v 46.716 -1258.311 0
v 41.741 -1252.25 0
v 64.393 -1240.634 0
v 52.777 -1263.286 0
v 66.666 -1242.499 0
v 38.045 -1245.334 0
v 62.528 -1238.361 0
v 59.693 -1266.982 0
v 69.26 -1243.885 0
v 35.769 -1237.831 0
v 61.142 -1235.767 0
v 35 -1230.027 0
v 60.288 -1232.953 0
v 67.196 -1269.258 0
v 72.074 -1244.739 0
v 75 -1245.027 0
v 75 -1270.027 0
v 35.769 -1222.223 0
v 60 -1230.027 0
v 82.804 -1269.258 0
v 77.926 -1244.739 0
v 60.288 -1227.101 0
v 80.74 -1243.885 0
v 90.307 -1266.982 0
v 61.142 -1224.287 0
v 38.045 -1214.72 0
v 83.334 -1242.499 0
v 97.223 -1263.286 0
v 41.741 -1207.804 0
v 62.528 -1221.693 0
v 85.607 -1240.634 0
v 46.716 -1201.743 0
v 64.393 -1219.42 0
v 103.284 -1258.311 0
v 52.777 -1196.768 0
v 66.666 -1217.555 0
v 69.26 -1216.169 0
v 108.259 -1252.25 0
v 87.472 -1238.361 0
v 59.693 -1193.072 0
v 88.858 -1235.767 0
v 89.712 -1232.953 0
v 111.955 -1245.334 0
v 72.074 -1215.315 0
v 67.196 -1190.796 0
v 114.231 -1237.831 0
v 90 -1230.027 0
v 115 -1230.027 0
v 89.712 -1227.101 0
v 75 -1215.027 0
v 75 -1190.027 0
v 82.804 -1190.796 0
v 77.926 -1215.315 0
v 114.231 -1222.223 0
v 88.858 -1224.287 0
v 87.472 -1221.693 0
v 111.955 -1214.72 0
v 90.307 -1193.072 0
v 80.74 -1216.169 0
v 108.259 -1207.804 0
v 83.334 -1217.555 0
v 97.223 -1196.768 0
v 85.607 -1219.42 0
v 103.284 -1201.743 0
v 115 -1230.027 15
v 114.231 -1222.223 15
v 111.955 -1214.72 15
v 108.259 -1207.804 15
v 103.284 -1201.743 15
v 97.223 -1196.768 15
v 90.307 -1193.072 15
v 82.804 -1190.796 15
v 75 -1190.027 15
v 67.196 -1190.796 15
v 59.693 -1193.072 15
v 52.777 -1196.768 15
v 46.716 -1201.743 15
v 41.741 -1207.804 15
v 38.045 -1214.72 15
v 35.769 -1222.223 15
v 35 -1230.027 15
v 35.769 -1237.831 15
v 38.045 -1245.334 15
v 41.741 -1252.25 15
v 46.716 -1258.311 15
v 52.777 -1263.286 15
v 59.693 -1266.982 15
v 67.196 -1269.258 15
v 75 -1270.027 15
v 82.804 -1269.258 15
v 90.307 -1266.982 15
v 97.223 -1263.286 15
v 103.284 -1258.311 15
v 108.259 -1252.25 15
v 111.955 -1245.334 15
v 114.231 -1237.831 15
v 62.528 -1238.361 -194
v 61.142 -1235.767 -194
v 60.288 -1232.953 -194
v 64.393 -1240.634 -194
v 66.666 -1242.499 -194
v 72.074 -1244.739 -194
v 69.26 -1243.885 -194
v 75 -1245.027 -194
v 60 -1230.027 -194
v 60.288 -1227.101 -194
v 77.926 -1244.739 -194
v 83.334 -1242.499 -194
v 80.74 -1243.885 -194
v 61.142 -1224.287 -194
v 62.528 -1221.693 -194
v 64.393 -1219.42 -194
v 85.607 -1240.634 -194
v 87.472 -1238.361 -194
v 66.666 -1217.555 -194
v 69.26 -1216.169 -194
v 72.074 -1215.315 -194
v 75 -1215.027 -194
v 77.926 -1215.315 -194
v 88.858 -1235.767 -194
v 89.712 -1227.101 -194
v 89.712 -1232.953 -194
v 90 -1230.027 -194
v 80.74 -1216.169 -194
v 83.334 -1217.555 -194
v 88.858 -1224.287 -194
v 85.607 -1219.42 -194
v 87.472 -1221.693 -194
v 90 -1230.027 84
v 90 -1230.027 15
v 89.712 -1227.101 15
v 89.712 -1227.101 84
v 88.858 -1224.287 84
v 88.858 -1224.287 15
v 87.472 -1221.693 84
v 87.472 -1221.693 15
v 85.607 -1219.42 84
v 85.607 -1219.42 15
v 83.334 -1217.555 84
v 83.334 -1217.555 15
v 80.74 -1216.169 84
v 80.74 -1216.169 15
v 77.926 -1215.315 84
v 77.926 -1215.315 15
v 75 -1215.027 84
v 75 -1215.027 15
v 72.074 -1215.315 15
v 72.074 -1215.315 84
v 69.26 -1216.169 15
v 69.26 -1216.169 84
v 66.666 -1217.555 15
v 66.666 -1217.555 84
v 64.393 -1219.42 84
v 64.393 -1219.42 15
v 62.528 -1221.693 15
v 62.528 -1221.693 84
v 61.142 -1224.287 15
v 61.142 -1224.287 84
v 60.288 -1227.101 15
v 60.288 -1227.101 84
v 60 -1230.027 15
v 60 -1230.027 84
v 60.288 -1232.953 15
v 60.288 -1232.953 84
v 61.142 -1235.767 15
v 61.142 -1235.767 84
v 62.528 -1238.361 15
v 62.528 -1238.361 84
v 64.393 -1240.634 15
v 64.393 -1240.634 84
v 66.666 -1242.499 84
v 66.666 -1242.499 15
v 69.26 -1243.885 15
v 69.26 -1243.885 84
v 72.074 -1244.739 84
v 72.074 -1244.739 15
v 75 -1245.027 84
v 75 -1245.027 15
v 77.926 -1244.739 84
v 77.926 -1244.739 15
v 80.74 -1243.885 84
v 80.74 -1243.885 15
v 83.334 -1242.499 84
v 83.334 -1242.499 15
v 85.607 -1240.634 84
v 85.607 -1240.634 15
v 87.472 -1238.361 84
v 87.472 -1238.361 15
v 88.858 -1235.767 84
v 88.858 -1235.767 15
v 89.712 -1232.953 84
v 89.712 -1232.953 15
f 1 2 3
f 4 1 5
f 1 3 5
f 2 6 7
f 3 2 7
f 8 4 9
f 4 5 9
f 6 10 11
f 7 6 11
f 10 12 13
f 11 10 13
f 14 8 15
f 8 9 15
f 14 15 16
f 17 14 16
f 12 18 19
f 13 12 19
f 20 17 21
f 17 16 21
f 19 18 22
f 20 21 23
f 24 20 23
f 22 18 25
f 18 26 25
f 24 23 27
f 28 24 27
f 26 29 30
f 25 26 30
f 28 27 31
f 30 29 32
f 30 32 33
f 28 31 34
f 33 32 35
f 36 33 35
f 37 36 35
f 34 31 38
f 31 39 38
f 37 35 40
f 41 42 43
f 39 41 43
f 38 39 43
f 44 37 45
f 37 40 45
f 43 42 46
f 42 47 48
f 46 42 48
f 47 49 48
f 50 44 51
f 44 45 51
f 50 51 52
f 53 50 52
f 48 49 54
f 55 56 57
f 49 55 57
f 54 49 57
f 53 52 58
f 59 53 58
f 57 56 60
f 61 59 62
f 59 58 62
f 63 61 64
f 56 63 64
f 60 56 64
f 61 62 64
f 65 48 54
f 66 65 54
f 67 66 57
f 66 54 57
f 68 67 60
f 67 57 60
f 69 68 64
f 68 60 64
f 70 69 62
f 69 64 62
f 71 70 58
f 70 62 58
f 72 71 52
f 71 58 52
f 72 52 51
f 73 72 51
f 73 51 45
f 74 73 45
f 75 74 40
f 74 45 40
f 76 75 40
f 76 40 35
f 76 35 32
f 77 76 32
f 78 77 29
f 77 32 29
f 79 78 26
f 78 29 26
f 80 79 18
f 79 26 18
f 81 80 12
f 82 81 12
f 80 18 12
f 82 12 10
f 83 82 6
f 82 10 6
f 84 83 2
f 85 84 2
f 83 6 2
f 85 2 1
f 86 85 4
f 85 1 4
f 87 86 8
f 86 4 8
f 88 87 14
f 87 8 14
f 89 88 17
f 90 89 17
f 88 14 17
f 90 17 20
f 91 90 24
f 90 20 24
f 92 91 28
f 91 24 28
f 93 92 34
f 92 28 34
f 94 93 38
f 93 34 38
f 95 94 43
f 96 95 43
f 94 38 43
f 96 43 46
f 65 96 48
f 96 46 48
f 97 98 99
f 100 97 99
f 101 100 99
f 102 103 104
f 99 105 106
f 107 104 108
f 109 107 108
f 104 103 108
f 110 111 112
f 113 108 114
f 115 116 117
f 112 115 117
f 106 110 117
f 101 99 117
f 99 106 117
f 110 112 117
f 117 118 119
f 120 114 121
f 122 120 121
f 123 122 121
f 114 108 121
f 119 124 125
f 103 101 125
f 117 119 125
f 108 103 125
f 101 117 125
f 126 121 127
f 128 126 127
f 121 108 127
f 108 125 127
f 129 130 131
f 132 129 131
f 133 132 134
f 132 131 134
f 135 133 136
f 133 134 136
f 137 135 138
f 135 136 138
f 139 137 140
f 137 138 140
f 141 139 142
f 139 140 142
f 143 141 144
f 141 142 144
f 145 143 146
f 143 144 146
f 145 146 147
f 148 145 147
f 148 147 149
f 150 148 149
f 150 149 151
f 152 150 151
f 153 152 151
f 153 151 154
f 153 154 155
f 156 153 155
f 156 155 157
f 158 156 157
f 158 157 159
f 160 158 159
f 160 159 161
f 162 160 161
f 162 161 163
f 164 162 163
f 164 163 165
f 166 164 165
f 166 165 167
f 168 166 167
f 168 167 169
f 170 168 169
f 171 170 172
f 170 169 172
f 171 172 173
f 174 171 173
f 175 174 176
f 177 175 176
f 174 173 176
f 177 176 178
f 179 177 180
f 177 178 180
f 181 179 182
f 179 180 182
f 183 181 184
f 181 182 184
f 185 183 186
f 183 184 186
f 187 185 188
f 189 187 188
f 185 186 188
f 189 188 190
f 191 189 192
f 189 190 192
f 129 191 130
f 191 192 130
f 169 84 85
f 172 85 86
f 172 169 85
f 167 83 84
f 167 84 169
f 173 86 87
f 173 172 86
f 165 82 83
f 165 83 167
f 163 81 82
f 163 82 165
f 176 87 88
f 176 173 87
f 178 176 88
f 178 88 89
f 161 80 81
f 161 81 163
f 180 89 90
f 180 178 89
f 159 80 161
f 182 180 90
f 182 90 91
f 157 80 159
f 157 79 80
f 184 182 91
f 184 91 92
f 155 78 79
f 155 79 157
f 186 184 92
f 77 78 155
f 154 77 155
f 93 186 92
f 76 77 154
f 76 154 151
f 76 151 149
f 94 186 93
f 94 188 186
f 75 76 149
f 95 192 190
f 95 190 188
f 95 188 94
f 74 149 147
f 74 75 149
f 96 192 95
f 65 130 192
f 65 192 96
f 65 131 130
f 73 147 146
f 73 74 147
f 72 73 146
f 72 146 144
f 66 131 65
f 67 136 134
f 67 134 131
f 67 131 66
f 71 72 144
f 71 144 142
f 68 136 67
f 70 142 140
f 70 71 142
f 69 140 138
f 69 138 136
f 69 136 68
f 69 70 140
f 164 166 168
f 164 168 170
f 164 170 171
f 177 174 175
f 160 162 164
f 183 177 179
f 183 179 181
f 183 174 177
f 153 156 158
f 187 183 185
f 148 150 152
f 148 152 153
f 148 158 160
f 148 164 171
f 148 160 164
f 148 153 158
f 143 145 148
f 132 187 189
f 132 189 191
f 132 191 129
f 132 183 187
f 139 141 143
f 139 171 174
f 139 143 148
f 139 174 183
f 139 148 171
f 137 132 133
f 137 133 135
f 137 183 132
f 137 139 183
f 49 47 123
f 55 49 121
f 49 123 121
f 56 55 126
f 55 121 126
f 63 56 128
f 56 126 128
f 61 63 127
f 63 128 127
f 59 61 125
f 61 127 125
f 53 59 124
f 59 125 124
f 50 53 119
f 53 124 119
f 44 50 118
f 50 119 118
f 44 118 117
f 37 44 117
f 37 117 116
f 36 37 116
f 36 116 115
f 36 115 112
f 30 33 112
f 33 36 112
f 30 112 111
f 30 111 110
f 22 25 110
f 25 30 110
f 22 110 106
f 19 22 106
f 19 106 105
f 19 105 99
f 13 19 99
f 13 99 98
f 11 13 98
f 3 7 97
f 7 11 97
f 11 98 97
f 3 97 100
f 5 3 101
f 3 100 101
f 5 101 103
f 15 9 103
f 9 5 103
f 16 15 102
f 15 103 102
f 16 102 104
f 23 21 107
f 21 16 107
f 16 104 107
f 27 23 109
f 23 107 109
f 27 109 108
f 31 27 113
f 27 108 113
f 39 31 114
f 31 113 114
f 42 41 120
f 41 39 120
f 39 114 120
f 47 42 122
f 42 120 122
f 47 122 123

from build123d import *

# Parameters (mm, degrees)
SKETCH1_R                = 40
BOSS_EXTRUDE1_DEPTH      = 15
BOSS_EXTRUDE2_DEPTH      = 69
BOSS_EXTRUDE2_DEPTH_BACK = 209
SKETCH2_R                = 15


with BuildPart() as part:
    # Sketch1 → Boss-Extrude1 (new body)
    with BuildSketch(Plane.XY):
        with Locations((75, -1230.027041119)):
            Circle(SKETCH1_R)
    extrude(amount=BOSS_EXTRUDE1_DEPTH)

    # Sketch2 → Boss-Extrude2 (add, two sides: drawn at the far end of the back side and taken through both)
    with BuildSketch(Plane.XY.offset(15).offset(-BOSS_EXTRUDE2_DEPTH_BACK)):
        with Locations((75, -1230.027041119)):
            Circle(SKETCH2_R)
    extrude(amount=BOSS_EXTRUDE2_DEPTH + BOSS_EXTRUDE2_DEPTH_BACK)


solid = part.part
